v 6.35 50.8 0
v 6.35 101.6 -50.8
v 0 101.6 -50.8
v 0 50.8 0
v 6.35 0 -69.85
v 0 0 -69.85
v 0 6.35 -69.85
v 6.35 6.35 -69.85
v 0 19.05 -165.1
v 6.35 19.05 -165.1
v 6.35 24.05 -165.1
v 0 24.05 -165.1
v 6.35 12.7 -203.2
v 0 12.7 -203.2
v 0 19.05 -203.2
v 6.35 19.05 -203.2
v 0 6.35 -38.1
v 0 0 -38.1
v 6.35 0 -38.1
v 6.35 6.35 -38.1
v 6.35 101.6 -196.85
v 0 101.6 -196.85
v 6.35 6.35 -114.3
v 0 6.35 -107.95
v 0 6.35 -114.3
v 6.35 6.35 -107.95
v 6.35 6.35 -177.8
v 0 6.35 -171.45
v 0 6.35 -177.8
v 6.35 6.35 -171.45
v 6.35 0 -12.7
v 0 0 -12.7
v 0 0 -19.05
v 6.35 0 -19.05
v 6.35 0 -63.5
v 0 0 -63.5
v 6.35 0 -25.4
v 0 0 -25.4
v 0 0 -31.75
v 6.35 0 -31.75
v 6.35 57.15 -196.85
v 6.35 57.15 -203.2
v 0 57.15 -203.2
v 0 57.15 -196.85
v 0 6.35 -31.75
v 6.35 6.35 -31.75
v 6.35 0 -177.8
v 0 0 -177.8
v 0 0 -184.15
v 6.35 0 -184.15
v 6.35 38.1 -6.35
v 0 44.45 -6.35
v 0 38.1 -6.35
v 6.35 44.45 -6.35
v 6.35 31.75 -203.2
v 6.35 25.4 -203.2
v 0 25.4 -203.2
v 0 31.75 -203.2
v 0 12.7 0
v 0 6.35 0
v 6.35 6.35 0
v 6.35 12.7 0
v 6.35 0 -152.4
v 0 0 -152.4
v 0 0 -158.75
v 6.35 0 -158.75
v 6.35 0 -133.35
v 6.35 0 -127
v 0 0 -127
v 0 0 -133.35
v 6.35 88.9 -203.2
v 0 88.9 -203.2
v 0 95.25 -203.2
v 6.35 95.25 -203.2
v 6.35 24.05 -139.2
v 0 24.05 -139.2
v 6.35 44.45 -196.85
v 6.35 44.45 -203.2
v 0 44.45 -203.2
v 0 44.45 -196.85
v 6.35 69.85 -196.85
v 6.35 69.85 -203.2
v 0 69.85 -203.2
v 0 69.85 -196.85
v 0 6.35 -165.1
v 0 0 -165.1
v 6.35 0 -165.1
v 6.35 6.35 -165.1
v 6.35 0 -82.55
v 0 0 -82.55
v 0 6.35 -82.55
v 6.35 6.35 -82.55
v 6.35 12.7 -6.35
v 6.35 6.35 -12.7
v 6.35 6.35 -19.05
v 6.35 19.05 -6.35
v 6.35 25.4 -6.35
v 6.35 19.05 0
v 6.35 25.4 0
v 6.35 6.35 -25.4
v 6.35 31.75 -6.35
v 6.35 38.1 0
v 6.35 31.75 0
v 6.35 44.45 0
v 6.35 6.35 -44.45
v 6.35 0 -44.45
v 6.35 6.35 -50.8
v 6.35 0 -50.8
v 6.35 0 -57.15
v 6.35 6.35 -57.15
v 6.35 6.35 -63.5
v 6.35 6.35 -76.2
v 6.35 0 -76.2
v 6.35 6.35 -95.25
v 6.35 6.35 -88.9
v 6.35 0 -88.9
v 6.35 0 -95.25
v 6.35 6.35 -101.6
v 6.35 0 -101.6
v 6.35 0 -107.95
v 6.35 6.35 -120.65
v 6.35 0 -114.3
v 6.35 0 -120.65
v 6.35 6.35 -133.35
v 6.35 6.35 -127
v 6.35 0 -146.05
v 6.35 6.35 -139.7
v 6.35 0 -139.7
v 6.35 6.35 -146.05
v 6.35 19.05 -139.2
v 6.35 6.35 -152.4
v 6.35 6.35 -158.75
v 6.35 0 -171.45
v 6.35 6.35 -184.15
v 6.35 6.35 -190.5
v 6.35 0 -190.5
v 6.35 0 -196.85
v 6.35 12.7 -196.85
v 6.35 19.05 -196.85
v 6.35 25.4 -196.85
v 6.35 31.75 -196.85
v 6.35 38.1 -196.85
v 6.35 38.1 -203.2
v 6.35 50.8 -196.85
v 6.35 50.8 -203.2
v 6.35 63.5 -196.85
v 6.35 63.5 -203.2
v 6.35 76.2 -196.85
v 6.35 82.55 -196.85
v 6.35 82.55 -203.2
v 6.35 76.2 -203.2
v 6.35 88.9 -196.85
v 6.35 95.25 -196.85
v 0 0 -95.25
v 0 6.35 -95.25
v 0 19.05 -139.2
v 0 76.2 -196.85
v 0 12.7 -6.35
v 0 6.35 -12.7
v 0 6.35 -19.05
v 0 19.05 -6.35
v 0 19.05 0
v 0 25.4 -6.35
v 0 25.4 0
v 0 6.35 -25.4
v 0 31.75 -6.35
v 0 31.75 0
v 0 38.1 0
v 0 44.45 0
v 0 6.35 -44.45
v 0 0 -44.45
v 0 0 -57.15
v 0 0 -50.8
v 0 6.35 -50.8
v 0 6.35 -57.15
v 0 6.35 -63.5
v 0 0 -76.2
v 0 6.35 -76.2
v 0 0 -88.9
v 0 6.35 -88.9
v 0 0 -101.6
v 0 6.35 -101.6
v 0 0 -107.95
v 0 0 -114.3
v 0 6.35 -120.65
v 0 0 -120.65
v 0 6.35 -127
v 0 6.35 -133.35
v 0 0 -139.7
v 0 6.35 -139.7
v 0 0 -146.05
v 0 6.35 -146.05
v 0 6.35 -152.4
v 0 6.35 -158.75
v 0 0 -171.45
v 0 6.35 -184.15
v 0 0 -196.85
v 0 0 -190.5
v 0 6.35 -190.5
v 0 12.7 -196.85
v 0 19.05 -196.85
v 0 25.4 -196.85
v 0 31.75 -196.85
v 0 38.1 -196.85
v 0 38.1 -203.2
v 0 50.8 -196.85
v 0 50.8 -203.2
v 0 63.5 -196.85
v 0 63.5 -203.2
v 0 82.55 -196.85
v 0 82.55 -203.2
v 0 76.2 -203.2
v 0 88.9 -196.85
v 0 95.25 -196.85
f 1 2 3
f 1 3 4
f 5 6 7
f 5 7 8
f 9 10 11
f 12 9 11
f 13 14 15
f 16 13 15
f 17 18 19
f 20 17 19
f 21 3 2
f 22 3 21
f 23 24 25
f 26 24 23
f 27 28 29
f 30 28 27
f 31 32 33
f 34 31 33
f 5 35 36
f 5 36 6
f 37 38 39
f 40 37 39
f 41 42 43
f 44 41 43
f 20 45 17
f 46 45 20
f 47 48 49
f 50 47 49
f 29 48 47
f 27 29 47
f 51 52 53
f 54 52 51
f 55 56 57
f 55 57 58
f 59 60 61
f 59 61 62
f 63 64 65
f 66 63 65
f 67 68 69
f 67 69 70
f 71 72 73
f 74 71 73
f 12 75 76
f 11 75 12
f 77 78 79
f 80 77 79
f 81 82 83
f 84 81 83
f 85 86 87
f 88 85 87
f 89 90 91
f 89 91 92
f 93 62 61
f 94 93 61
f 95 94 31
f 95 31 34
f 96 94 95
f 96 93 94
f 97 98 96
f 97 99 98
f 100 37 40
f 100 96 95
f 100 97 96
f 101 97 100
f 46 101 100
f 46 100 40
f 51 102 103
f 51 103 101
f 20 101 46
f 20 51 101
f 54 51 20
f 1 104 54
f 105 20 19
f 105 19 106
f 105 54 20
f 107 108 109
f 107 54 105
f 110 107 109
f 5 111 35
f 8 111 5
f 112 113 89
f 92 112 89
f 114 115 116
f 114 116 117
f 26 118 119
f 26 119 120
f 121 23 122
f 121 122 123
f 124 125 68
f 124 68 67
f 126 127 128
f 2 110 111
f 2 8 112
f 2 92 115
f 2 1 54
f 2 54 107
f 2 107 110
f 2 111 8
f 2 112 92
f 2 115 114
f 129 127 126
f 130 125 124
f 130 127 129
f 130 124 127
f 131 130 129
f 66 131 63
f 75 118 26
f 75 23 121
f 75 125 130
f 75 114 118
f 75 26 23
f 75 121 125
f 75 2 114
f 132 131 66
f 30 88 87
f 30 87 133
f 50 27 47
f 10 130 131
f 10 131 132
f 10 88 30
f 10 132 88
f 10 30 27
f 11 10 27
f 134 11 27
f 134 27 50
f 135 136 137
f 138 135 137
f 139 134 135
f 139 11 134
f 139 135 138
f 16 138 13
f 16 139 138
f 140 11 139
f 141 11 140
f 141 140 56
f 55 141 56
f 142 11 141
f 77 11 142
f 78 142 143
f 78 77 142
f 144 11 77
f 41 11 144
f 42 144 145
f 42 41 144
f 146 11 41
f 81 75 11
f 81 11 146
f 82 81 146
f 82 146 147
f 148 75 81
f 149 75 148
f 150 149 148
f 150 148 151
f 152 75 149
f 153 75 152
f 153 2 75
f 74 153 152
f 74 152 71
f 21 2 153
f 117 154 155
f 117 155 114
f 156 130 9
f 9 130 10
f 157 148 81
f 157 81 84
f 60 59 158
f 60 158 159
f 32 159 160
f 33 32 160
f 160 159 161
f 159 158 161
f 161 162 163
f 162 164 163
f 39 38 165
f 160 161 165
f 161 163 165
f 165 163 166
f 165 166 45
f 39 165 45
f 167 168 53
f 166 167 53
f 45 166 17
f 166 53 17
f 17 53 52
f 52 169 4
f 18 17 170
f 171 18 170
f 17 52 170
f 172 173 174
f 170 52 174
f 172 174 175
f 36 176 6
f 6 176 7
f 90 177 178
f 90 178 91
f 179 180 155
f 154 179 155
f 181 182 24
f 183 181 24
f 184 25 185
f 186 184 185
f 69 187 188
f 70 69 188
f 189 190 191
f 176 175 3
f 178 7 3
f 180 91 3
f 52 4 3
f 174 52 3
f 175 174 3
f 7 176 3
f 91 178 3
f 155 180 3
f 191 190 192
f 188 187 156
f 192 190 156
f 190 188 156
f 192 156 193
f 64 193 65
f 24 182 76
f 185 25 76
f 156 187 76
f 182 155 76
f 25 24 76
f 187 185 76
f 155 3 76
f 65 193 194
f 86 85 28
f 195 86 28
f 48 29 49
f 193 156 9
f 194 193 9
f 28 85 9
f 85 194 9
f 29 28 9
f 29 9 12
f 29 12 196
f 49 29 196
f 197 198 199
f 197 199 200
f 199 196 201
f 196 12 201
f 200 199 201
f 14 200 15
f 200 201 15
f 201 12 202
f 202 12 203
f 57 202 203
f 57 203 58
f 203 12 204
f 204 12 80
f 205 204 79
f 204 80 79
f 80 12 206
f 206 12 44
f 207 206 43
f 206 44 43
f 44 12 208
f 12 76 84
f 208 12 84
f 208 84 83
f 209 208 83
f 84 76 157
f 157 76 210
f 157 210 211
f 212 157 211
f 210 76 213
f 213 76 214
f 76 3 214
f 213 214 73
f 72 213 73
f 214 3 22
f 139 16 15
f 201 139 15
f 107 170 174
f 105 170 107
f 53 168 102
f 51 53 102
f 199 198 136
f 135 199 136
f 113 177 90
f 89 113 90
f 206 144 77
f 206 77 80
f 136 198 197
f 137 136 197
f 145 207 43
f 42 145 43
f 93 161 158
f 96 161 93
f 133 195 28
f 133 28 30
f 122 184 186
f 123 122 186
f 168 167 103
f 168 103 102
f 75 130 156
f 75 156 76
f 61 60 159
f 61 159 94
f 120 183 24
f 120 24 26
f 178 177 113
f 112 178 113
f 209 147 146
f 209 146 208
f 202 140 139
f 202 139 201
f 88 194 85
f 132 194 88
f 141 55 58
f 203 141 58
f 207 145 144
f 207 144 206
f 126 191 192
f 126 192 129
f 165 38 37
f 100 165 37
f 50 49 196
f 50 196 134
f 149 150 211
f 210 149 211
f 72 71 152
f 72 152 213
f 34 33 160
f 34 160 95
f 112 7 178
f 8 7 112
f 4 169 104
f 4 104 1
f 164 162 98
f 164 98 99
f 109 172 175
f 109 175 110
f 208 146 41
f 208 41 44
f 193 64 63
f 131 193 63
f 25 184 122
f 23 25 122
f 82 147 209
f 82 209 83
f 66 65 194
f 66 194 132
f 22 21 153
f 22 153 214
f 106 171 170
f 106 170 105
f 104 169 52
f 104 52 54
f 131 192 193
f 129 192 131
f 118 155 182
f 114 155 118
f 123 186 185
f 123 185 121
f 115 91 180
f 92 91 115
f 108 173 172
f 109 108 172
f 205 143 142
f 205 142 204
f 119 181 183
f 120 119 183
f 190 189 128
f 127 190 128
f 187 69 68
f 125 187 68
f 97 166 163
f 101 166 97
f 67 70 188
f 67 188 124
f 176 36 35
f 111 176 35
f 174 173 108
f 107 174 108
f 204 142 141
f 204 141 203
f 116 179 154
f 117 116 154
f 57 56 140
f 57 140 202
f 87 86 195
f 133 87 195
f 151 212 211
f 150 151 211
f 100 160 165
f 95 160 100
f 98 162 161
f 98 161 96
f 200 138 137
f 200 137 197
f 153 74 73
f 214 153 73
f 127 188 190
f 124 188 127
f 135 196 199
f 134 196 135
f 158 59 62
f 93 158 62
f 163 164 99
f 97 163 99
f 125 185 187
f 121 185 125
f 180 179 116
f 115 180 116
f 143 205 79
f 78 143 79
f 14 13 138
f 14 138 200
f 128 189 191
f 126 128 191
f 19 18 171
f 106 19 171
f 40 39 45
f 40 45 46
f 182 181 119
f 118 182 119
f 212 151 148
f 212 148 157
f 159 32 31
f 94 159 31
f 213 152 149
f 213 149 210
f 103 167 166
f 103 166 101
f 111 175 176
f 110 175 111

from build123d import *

# Parameters (mm, degrees)
SKETCH1_W           = 203.2
SKETCH1_H           = 101.6
BOSS_EXTRUDE1_DEPTH = 6.35
SKETCH2_W           = 6.35
SKETCH2_H           = 12.7
CUT_EXTRUDE1_DEPTH  = 6.35
SKETCH5_W           = 6.35
SKETCH5_H           = 6.35
CUT_EXTRUDE3_DEPTH  = 6.35
LPATTERN1_COUNT     = 15
LPATTERN1_PITCH     = 12.7
SKETCH6_W           = 6.35
SKETCH6_H           = 6.35
CUT_EXTRUDE4_DEPTH  = 6.35
SKETCH7_W           = 6.35
SKETCH7_H           = 6.35
CUT_EXTRUDE5_DEPTH  = 6.35
LPATTERN2_COUNT     = 7
LPATTERN2_PITCH     = 12.7
CUT_EXTRUDE6_DEPTH  = 6.35
SKETCH9_W           = 6.35
SKETCH9_H           = 6.35
CUT_EXTRUDE7_DEPTH  = 6.35
LPATTERN3_COUNT     = 3
LPATTERN3_PITCH     = 12.7
SKETCH10_W          = 25.9
SKETCH10_H          = 5
CUT_EXTRUDE8_DEPTH  = 6.35


with BuildPart() as part:
    # Sketch1 → Boss-Extrude1 (new body)
    with BuildSketch(Plane(origin=(0, 0, 0), x_dir=(0, 0, -1), z_dir=(1, 0, 0))):
        with Locations((101.6, 50.8)):
            Rectangle(SKETCH1_W, SKETCH1_H)
    extrude(amount=BOSS_EXTRUDE1_DEPTH)

    # Sketch2 → Cut-Extrude1 (cut)
    with BuildSketch(Plane.XZ):
        with Locations((3.175, -6.35)):
            Rectangle(SKETCH2_W, SKETCH2_H)
    extrude(amount=-CUT_EXTRUDE1_DEPTH, mode=Mode.SUBTRACT)

    # Sketch5 → Cut-Extrude3 (cut)
    with BuildSketch(Plane.XZ):
        with Locations((3.175, -22.225)):
            Rectangle(SKETCH5_W, SKETCH5_H)
    cut_extrude3 = extrude(amount=-CUT_EXTRUDE3_DEPTH, mode=Mode.SUBTRACT)

    # LPattern1: Cut-Extrude3 ×15
    with Locations(*[(0, 0, -i * LPATTERN1_PITCH) for i in range(1, LPATTERN1_COUNT)]):
        add(cut_extrude3, mode=Mode.SUBTRACT)

    # Sketch6 → Cut-Extrude4 (cut)
    with BuildSketch(Plane(origin=(0, 0, -203.2), x_dir=(-1, 0, 0), z_dir=(0, 0, -1))):
        with Locations((-3.175, 9.525)):
            Rectangle(SKETCH6_W, SKETCH6_H)
    extrude(amount=-CUT_EXTRUDE4_DEPTH, mode=Mode.SUBTRACT)

    # Sketch7 → Cut-Extrude5 (cut)
    with BuildSketch(Plane(origin=(0, 0, -203.2), x_dir=(-1, 0, 0), z_dir=(0, 0, -1))):
        with Locations((-3.175, 22.225)):
            Rectangle(SKETCH7_W, SKETCH7_H)
    cut_extrude5 = extrude(amount=-CUT_EXTRUDE5_DEPTH, mode=Mode.SUBTRACT)

    # LPattern2: Cut-Extrude5 ×7
    with Locations(*[(0, i * LPATTERN2_PITCH, 0) for i in range(1, LPATTERN2_COUNT)]):
        add(cut_extrude5, mode=Mode.SUBTRACT)

    # Sketch8 → Cut-Extrude6 (cut)
    with BuildSketch(Plane(origin=(6.35, 0, 0), x_dir=(0, 0, -1), z_dir=(1, 0, 0))):
        Polygon((0, 101.6), (50.8, 101.6), (0, 50.8), align=None)
    extrude(amount=-CUT_EXTRUDE6_DEPTH, mode=Mode.SUBTRACT)

    # Sketch9 → Cut-Extrude7 (cut)
    with BuildSketch(Plane.XY):
        with Locations((3.175, 15.875)):
            Rectangle(SKETCH9_W, SKETCH9_H)
    cut_extrude7 = extrude(amount=-CUT_EXTRUDE7_DEPTH, mode=Mode.SUBTRACT)

    # LPattern3: Cut-Extrude7 ×3
    with Locations(*[(0, i * LPATTERN3_PITCH, 0) for i in range(1, LPATTERN3_COUNT)]):
        add(cut_extrude7, mode=Mode.SUBTRACT)

    # Sketch10 → Cut-Extrude8 (cut)
    with BuildSketch(Plane(origin=(6.35, 0, 0), x_dir=(0, 0, -1), z_dir=(1, 0, 0))):
        with Locations((152.15, 21.55)):
            Rectangle(SKETCH10_W, SKETCH10_H)
    extrude(amount=-CUT_EXTRUDE8_DEPTH, mode=Mode.SUBTRACT)


solid = part.part
